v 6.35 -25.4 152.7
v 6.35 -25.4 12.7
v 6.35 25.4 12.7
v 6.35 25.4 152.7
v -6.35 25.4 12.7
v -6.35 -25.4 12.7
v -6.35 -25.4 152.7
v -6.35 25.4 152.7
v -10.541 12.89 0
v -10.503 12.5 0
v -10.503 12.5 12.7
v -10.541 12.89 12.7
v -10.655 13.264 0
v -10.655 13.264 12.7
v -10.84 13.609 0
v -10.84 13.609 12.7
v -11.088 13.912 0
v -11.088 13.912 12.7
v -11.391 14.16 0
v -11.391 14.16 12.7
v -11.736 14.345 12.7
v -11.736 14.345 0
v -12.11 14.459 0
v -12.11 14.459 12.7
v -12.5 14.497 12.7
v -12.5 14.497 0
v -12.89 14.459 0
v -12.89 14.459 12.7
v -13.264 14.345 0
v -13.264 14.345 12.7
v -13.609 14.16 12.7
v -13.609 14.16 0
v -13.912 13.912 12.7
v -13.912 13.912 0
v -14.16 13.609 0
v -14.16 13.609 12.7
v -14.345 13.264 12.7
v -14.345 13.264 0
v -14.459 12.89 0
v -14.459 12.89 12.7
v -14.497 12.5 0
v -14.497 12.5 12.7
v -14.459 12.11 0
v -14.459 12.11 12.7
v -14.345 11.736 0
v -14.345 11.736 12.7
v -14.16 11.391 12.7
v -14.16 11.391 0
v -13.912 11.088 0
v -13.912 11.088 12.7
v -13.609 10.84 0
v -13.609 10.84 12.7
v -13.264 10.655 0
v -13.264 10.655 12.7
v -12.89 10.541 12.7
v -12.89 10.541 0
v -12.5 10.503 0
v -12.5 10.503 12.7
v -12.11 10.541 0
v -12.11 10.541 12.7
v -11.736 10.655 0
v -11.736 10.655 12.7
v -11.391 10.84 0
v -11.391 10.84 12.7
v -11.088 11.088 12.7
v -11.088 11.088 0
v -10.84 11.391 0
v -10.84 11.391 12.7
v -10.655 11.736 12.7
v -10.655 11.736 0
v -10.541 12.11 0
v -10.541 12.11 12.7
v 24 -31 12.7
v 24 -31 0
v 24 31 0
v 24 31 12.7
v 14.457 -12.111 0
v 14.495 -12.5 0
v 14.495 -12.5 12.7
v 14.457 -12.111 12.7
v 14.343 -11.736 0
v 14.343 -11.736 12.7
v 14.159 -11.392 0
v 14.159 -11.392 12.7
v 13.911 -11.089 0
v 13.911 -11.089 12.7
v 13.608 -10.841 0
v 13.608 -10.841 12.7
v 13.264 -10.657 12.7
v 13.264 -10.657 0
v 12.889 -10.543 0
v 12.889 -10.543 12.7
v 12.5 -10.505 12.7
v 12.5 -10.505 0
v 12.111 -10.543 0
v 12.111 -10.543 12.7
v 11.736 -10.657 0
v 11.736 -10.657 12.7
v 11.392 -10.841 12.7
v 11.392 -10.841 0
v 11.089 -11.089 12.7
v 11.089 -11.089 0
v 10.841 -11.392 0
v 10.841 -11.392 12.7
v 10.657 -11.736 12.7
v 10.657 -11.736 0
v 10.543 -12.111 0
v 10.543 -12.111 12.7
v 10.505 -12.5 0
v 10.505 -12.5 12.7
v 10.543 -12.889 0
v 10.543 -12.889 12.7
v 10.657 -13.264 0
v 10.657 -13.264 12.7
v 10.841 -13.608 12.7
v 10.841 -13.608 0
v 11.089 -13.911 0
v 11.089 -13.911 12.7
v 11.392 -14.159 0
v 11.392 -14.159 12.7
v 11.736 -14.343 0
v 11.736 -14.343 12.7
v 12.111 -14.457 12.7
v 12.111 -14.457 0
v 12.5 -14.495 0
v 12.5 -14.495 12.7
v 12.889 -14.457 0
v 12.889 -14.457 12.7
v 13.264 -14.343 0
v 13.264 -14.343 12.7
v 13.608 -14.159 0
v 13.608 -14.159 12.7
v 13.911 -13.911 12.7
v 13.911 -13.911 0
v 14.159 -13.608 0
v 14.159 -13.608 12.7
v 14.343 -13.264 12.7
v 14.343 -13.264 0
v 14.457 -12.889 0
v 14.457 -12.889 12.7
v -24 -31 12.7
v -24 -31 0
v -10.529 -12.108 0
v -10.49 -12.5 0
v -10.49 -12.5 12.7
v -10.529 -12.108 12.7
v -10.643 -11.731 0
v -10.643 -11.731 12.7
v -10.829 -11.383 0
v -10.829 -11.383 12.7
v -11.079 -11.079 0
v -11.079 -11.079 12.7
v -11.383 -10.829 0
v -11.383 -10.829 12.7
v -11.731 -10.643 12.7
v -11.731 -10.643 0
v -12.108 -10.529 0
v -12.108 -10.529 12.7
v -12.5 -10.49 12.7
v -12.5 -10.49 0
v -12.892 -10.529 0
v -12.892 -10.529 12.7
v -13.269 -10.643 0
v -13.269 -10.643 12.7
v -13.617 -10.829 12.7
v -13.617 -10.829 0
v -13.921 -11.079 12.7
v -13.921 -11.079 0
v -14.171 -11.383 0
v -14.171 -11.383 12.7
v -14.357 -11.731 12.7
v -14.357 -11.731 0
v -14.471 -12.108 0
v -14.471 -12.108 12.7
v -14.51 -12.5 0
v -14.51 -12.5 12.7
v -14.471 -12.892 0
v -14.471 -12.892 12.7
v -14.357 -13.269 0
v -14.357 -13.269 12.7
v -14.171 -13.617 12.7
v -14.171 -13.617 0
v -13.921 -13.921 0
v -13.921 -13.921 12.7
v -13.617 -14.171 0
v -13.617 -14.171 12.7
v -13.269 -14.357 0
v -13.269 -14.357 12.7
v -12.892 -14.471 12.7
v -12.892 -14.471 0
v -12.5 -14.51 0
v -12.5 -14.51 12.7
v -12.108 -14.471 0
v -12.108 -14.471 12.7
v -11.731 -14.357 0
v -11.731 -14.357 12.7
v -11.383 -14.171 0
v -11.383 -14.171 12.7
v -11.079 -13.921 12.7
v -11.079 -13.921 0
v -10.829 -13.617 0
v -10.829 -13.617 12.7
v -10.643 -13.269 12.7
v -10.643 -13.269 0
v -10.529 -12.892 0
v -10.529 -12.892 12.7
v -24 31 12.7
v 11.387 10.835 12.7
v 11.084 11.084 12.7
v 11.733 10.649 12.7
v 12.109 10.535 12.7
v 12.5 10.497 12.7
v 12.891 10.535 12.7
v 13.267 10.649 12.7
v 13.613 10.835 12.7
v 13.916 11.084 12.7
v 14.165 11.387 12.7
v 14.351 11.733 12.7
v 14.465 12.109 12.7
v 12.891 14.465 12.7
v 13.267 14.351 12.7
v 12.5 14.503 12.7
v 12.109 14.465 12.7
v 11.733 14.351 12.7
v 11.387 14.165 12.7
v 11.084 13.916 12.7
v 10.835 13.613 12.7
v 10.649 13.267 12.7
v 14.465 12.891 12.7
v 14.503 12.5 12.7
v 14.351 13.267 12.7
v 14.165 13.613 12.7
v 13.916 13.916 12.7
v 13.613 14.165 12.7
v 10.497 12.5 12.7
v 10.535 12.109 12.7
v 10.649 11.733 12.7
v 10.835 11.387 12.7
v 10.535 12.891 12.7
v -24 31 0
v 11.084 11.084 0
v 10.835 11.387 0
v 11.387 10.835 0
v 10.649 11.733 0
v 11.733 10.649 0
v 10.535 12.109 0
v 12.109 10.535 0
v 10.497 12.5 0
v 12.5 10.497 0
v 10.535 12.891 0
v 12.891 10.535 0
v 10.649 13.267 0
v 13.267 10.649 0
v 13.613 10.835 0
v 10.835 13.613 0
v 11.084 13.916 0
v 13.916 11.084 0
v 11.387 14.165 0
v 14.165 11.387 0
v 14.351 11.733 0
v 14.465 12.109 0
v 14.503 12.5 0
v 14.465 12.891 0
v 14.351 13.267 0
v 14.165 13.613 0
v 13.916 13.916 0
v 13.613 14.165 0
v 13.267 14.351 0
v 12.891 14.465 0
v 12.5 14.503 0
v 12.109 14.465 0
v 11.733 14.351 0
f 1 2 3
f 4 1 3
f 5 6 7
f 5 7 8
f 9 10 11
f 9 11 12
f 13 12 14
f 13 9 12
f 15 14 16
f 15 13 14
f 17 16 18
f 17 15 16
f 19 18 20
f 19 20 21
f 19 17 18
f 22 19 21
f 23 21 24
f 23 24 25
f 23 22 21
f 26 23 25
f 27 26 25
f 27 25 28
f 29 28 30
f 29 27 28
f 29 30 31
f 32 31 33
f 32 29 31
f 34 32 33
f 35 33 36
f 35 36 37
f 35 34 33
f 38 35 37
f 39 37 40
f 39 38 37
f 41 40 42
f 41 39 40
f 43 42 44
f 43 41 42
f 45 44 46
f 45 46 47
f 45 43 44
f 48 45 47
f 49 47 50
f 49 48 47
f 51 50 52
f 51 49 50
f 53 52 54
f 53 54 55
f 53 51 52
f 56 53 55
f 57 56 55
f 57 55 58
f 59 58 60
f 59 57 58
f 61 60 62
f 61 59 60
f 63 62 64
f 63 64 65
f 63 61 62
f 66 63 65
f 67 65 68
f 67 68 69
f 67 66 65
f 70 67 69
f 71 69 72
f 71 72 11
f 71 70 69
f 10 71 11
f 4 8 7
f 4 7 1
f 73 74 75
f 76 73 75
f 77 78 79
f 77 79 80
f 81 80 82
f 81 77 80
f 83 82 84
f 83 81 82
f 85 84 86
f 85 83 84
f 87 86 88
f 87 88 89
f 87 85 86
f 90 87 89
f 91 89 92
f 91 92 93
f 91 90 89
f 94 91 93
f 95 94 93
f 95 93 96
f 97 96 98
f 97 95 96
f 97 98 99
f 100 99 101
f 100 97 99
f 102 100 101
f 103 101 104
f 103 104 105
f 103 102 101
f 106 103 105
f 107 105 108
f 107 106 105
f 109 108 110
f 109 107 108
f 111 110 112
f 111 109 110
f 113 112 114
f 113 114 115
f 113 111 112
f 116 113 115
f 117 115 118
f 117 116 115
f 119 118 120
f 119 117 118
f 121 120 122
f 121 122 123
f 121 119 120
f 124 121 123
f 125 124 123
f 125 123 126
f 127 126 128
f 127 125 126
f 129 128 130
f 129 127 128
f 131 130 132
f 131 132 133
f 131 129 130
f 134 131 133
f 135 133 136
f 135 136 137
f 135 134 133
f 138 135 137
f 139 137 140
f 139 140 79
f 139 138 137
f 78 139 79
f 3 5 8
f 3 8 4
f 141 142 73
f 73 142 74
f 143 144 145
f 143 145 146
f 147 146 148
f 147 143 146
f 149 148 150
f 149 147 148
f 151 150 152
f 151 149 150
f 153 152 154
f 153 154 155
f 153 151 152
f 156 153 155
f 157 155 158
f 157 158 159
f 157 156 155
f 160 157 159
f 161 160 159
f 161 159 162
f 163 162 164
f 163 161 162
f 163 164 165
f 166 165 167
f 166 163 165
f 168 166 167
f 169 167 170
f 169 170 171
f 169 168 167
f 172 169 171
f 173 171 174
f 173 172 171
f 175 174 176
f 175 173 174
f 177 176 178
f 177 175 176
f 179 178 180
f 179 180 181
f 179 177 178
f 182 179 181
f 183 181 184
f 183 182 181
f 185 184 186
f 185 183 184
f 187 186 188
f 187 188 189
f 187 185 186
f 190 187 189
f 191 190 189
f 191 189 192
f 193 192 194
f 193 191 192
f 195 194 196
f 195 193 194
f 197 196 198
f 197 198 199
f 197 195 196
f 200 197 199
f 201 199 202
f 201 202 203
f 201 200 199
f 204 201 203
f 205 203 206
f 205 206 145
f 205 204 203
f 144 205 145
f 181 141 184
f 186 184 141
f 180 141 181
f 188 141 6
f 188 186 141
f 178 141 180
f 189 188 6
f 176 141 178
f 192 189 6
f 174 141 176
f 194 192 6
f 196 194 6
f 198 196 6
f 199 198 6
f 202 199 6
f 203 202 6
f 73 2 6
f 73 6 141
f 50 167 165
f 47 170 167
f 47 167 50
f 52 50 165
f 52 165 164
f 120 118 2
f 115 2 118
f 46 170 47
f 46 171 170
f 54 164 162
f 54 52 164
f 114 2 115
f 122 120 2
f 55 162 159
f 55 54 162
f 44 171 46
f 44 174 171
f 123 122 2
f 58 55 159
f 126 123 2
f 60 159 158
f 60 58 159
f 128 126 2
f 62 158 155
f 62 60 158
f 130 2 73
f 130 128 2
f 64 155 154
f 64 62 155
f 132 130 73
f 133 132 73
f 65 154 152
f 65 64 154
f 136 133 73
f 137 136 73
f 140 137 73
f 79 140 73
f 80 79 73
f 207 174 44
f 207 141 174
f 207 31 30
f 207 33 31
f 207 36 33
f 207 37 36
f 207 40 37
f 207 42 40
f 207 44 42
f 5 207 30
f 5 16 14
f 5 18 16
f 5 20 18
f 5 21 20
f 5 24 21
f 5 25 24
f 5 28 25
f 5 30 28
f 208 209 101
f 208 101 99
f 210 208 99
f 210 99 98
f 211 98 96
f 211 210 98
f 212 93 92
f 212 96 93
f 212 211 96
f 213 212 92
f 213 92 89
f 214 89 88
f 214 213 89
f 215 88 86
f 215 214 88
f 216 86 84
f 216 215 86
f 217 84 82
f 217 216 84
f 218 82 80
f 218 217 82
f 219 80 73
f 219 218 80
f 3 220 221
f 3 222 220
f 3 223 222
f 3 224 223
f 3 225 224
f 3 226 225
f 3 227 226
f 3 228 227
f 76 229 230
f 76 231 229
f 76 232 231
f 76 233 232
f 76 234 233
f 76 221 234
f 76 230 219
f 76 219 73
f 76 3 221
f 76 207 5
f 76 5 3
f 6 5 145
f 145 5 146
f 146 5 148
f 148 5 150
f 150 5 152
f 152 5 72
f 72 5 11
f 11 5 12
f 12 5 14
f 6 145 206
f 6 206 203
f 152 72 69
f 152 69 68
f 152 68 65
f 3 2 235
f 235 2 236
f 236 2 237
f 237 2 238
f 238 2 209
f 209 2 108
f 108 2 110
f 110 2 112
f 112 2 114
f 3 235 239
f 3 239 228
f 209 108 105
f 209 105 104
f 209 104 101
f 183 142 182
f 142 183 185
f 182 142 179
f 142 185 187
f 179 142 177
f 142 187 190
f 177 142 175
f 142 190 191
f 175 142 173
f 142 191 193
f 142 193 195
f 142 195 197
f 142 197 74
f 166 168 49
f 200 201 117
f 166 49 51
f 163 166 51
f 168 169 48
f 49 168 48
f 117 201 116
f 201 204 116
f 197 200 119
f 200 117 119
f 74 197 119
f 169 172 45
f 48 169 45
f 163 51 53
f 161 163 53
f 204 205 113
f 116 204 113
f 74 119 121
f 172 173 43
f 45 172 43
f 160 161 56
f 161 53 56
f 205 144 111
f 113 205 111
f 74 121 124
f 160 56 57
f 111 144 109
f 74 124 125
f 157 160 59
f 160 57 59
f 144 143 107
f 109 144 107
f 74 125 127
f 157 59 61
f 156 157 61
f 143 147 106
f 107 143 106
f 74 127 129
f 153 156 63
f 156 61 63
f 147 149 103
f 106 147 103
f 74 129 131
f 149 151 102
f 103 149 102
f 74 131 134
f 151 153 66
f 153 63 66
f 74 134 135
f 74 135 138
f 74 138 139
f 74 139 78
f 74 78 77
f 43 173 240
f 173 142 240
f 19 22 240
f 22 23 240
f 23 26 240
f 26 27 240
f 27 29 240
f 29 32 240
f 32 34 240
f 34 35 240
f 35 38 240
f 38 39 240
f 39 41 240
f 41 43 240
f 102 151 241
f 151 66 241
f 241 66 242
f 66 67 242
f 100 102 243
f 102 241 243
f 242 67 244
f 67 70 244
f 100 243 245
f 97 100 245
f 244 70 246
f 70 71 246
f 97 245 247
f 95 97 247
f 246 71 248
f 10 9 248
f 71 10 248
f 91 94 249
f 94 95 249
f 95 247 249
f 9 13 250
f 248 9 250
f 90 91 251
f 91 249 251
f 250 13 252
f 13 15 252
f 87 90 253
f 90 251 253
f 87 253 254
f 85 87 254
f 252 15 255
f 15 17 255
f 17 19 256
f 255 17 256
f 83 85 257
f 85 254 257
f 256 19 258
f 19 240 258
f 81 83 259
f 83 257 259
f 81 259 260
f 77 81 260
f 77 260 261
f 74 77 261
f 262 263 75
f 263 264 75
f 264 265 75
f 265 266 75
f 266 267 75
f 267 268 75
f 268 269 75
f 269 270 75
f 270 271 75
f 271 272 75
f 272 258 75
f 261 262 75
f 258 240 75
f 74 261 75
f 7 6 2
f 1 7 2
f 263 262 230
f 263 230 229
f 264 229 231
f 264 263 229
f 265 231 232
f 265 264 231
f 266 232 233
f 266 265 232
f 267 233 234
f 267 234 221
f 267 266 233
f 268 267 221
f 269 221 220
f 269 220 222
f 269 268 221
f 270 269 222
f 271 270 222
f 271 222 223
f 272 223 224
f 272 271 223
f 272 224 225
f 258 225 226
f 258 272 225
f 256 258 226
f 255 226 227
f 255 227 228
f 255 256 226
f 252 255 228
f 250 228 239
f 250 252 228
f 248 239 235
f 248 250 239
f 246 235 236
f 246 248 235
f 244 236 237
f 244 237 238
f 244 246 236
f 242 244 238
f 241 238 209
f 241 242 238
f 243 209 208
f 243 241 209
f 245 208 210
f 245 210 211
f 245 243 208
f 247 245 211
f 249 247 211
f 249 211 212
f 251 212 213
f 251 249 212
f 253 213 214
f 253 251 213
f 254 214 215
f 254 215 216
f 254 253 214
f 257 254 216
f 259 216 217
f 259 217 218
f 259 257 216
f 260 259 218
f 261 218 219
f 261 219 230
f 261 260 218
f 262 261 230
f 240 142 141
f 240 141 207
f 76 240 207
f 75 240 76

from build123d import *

# Parameters (mm, degrees)
CROQUIS1_W              = 48
CROQUIS1_H              = 62
CROQUIS1_R              = 1.996960485
CROQUIS1_R_2            = 2.003004462
CROQUIS1_R_3            = 2.010116485
CROQUIS1_R_4            = 1.995123233
SALIENTE_EXTRUIR1_DEPTH = 12.7
CROQUIS2_W              = 12.7
CROQUIS2_H              = 50.8
SALIENTE_EXTRUIR2_DEPTH = 140


with BuildPart() as part:
    # Croquis1 → Saliente-Extruir1 (new body)
    with BuildSketch(Plane.XY):
        Rectangle(CROQUIS1_W, CROQUIS1_H)
        with Locations((-12.5, 12.5)):
            Circle(CROQUIS1_R, mode=Mode.SUBTRACT)
        with Locations((12.5, 12.5)):
            Circle(CROQUIS1_R_2, mode=Mode.SUBTRACT)
        with Locations((-12.5, -12.5)):
            Circle(CROQUIS1_R_3, mode=Mode.SUBTRACT)
        with Locations((12.5, -12.5)):
            Circle(CROQUIS1_R_4, mode=Mode.SUBTRACT)
    extrude(amount=SALIENTE_EXTRUIR1_DEPTH)

    # Croquis2 → Saliente-Extruir2 (add)
    with BuildSketch(Plane.XY.offset(12.7)):
        Rectangle(CROQUIS2_W, CROQUIS2_H)
    extrude(amount=SALIENTE_EXTRUIR2_DEPTH)


solid = part.part
